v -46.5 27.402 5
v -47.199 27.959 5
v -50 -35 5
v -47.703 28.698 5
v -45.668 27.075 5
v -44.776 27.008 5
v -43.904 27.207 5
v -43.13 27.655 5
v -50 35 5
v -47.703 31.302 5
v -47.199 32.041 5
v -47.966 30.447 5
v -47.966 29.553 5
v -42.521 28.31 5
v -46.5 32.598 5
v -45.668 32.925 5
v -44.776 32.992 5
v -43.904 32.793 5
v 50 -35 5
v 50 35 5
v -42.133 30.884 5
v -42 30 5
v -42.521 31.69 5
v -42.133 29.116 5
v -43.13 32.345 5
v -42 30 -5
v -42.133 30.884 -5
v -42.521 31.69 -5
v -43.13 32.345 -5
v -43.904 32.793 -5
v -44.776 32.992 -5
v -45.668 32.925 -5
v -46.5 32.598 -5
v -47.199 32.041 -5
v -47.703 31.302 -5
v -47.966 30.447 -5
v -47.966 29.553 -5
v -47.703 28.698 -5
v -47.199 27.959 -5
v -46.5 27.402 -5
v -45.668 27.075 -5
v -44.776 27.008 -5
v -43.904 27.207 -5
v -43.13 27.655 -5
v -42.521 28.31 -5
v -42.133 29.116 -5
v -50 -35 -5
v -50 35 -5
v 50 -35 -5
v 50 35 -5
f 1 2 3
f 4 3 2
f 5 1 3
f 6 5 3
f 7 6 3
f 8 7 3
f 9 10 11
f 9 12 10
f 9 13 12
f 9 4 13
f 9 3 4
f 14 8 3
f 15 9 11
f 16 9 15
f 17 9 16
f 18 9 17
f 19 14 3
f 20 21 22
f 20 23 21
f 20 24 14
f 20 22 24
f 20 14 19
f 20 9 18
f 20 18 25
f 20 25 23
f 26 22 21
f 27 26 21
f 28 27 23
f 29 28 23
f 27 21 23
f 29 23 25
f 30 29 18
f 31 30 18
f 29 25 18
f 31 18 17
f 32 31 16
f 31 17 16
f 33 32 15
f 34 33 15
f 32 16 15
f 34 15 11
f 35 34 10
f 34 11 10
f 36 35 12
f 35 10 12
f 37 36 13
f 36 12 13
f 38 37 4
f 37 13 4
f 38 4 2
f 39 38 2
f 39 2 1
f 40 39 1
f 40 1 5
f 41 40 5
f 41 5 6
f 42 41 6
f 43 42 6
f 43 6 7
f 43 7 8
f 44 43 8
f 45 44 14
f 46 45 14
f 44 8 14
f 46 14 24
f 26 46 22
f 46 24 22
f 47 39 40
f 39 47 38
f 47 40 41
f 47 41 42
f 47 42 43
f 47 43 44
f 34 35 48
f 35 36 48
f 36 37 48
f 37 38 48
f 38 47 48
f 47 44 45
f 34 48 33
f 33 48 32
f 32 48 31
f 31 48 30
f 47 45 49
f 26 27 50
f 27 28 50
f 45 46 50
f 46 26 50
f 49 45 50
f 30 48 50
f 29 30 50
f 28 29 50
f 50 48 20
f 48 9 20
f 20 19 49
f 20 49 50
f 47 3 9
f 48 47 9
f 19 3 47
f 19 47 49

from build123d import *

# Parameters (mm, degrees)
SKETCH_1_W          = 100
SKETCH_1_H          = 70
EXTRUDE_1_DEPTH     = 5
SKETCH_2_R          = 3
CUT_EXTRUDE_1_DEPTH = 10


with BuildPart() as part:
    # 草图1 → 凸台-拉伸1 (new, symmetric)
    with BuildSketch(Plane.XY):
        Rectangle(SKETCH_1_W, SKETCH_1_H)
    extrude(amount=EXTRUDE_1_DEPTH, both=True)

    # 草图2 → 切除-拉伸1 (cut)
    with BuildSketch(Plane.XY.offset(5)):
        with Locations((-45, 30)):
            Circle(SKETCH_2_R)
    extrude(amount=-CUT_EXTRUDE_1_DEPTH, mode=Mode.SUBTRACT)


solid = part.part
